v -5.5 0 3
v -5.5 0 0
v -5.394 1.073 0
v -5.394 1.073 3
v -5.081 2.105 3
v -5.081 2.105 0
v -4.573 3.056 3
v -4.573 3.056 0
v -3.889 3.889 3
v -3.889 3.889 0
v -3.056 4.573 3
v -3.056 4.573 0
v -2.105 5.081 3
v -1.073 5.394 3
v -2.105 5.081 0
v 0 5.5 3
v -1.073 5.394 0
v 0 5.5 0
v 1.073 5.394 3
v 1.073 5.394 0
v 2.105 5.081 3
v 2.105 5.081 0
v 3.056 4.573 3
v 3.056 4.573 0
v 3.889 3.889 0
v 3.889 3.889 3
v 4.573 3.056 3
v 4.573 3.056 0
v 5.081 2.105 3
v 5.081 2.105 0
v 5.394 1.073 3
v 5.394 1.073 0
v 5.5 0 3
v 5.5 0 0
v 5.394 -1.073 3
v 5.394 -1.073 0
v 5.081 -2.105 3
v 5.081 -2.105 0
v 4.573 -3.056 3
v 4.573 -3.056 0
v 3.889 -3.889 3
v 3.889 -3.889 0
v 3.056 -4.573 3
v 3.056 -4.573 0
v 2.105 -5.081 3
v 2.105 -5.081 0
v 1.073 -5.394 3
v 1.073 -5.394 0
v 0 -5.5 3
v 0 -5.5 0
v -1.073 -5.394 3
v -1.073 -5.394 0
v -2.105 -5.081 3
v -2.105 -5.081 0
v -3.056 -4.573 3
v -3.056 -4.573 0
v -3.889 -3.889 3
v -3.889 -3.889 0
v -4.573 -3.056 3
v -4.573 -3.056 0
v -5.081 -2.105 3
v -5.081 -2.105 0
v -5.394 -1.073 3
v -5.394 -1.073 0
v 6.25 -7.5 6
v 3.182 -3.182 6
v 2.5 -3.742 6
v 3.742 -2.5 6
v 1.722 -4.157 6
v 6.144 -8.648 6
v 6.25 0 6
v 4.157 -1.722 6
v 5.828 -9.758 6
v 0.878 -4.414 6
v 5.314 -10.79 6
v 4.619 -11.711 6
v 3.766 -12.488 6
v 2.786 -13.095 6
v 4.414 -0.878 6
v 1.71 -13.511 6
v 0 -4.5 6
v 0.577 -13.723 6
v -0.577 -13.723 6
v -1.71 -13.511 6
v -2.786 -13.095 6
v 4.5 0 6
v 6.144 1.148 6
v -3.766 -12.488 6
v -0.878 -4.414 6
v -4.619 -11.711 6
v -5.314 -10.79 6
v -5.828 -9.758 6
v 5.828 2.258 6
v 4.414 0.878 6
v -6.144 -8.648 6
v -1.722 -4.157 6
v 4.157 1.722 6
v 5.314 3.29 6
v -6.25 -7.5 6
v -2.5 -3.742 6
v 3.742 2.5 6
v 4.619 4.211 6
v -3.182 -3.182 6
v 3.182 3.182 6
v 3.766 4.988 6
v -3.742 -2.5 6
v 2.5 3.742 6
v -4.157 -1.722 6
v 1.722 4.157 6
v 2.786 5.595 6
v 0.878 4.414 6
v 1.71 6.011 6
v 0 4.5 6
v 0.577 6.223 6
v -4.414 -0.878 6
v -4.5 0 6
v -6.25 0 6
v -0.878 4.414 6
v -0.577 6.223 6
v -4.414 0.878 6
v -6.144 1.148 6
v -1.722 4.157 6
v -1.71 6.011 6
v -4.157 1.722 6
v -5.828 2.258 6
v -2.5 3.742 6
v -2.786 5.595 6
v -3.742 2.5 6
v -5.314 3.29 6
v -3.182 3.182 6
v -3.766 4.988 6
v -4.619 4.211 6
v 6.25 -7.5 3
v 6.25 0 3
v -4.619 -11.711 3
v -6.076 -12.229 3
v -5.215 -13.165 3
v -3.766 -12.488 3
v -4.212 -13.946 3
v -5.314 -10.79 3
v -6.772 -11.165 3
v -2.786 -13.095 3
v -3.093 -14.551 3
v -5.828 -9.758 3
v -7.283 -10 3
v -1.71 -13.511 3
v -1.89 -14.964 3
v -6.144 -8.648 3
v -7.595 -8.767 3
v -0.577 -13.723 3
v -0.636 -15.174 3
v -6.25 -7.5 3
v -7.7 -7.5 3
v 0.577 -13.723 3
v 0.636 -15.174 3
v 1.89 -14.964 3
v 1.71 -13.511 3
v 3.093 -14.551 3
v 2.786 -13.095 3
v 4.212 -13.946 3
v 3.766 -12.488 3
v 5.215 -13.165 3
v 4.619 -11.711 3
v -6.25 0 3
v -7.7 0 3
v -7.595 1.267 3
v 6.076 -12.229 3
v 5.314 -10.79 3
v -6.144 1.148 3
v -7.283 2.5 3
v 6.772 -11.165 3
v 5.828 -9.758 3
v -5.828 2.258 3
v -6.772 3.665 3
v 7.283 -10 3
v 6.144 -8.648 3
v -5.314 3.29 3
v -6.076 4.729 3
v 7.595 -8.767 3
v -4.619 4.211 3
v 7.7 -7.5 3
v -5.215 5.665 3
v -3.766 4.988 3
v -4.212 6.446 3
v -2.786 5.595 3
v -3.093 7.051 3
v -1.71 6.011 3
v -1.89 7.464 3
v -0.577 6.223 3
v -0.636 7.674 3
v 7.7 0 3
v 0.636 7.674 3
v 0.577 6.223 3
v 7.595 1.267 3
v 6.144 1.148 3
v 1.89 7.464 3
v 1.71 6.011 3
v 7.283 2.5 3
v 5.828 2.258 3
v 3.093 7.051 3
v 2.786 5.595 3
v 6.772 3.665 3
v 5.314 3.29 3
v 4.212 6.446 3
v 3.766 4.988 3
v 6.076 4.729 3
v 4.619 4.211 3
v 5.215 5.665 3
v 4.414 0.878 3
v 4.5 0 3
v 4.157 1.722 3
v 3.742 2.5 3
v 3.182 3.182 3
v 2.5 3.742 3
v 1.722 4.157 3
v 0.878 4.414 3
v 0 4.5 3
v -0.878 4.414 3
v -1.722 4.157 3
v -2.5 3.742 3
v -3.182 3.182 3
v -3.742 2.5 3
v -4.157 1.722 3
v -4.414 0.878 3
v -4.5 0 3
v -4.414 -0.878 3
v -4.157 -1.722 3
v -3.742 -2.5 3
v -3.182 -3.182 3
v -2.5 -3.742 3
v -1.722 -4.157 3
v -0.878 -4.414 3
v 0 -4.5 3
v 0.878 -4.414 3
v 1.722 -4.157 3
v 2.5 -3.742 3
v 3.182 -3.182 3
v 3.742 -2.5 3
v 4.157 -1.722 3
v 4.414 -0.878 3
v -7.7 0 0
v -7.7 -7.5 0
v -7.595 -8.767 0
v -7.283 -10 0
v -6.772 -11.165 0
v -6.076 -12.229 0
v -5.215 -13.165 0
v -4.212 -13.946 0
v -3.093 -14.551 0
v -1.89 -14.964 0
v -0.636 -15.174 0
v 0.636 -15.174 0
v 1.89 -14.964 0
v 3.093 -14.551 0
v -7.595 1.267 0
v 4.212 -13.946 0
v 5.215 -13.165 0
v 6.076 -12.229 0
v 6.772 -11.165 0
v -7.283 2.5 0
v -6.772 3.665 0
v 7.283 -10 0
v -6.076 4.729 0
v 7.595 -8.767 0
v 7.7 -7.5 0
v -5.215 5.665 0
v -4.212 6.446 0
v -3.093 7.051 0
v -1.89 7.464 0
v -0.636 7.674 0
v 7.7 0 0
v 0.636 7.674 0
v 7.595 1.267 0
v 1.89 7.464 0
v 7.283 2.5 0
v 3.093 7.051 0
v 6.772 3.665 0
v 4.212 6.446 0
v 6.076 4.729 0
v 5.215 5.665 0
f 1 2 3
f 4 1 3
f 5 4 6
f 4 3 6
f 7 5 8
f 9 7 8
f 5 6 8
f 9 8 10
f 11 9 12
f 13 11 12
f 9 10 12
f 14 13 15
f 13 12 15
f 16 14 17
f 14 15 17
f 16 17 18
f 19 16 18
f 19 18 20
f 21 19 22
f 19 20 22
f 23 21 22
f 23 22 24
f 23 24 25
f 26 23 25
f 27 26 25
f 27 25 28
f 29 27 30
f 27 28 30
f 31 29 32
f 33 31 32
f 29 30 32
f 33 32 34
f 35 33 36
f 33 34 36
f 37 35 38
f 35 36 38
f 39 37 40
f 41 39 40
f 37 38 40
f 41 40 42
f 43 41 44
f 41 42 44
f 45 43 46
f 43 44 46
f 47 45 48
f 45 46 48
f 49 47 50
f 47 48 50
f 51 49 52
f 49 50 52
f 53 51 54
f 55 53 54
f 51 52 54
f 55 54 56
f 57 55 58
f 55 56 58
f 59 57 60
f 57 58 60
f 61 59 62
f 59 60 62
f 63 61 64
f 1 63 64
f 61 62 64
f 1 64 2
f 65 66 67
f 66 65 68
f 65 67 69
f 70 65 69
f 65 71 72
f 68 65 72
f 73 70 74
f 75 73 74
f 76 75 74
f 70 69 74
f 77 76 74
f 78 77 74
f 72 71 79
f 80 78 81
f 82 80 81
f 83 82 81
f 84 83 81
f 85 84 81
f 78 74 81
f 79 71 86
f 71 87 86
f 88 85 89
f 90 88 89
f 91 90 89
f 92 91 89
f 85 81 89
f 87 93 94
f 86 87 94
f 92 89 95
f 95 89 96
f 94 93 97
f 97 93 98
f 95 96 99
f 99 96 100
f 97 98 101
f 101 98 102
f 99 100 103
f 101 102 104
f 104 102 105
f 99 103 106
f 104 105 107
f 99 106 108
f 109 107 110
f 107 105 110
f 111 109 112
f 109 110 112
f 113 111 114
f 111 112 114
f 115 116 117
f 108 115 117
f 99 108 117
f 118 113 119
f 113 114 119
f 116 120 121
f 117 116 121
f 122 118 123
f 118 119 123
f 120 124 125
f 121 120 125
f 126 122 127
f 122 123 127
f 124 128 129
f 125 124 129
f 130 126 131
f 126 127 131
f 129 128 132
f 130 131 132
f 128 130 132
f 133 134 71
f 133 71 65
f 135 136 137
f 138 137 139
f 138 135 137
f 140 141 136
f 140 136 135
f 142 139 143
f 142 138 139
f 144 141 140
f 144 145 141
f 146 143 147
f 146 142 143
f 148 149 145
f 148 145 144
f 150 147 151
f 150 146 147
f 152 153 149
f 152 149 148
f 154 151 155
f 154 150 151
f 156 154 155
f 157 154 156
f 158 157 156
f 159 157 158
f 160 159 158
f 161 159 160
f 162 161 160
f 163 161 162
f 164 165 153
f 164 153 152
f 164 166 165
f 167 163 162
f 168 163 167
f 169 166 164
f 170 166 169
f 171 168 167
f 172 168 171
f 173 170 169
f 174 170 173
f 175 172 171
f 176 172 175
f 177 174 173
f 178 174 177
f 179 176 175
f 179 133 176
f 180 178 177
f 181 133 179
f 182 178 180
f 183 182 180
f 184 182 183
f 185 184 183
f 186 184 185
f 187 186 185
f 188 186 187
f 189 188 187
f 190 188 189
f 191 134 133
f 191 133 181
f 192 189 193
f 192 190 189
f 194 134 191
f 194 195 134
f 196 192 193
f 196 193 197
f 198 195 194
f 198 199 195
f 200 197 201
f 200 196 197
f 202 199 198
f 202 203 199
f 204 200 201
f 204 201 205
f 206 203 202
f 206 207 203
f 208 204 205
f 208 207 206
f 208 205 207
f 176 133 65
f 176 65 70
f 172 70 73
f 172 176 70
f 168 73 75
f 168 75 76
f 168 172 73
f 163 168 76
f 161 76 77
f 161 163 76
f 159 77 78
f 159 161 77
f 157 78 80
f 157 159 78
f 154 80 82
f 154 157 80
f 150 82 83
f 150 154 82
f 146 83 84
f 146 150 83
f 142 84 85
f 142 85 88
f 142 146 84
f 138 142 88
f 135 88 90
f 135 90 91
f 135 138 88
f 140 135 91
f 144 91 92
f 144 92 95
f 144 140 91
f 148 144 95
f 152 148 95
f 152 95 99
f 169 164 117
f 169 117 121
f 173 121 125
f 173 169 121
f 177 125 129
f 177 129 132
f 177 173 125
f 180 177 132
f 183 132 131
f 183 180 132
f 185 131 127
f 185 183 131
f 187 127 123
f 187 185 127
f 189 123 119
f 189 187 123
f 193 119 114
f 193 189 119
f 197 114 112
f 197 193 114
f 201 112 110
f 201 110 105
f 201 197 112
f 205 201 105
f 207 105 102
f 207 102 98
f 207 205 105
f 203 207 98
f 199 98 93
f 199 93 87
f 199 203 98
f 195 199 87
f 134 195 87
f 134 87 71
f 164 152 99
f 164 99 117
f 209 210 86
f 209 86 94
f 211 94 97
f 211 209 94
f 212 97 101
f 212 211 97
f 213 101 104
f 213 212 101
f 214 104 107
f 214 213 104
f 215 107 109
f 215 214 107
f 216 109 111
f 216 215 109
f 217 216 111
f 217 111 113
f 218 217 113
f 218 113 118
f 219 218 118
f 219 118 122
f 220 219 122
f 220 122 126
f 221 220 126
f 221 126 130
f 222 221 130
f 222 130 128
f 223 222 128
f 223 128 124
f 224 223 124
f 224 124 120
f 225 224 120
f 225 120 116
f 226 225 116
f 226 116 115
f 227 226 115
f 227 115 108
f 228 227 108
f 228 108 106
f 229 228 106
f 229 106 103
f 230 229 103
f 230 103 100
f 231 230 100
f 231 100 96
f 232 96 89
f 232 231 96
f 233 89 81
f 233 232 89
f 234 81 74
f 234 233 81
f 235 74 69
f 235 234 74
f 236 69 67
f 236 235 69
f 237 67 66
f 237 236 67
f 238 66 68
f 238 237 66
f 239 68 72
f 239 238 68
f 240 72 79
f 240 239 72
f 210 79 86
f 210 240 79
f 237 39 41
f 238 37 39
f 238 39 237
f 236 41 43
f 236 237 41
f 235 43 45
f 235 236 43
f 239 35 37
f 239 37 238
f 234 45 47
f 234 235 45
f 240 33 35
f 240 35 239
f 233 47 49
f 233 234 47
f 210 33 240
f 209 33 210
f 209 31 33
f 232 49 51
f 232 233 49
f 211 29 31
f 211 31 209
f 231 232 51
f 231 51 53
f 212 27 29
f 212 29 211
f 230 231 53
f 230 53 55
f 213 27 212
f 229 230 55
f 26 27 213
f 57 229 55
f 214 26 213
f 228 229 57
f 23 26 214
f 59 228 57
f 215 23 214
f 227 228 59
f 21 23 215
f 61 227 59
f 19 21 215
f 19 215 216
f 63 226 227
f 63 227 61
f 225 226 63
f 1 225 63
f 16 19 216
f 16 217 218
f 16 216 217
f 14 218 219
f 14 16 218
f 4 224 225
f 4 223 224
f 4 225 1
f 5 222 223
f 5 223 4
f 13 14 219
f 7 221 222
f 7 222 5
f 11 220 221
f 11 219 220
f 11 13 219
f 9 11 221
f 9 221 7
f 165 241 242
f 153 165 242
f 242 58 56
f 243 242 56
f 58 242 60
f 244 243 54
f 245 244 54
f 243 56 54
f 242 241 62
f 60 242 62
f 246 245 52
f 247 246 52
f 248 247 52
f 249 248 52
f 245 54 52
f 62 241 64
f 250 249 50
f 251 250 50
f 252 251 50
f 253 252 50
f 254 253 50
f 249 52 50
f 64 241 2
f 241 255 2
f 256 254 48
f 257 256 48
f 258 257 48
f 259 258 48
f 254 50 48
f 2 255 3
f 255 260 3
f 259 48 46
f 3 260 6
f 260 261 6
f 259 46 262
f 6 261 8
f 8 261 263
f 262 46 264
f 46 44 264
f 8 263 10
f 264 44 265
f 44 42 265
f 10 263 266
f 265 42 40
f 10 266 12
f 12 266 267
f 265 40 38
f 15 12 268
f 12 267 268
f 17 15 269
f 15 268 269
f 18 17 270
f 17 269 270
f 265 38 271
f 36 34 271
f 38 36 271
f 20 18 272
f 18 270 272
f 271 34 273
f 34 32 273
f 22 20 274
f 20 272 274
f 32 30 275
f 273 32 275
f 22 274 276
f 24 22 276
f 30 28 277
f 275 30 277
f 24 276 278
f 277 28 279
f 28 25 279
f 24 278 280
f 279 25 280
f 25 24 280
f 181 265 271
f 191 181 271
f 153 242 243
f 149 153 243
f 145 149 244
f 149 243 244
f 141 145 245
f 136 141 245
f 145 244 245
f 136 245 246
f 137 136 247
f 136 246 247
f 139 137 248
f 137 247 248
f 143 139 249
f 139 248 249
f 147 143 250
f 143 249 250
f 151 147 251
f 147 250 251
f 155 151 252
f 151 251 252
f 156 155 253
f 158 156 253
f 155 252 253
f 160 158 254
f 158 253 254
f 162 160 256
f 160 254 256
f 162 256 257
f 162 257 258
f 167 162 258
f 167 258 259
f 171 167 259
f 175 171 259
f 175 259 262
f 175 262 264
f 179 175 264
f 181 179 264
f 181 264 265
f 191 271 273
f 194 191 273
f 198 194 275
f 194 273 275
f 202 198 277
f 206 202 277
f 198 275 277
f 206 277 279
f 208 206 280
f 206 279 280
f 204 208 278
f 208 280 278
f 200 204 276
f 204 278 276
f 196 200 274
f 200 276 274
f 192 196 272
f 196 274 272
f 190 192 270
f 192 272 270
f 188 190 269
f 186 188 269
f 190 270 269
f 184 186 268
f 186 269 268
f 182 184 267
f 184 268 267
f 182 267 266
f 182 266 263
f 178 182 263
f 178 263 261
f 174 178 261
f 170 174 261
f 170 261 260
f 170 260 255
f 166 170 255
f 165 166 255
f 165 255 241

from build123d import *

# Parameters (mm, degrees)
SKETCH1_R           = 4.5
BOSS_EXTRUDE1_DEPTH = 6
SKETCH3_R           = 5.5
BOSS_EXTRUDE2_DEPTH = 3
SKETCH4_R           = 5.5
CUT_EXTRUDE1_DEPTH  = 3


with BuildPart() as part:
    # Sketch1 → Boss-Extrude1 (new body)
    with BuildSketch(Plane.XY):
        with BuildLine():
            Line((6.25, 0), (6.25, -7.5))
            ThreePointArc((6.25, -7.5), (0, -13.75), (-6.25, -7.5))
            Line((-6.25, -7.5), (-6.25, 0))
            ThreePointArc((-6.25, 0), (0, 6.25), (6.25, 0))
        make_face()
        Circle(SKETCH1_R, mode=Mode.SUBTRACT)
    extrude(amount=BOSS_EXTRUDE1_DEPTH)

    # Sketch3 → Boss-Extrude2 (add)
    with BuildSketch(Plane(origin=(0, 0, 0), x_dir=(-1, 0, 0), z_dir=(0, 0, -1))):
        with BuildLine():
            Line((7.7, 0), (7.7, -7.5))
            ThreePointArc((7.7, -7.5), (0, -15.2), (-7.7, -7.5))
            Line((-7.7, -7.5), (-7.7, 0))
            ThreePointArc((-7.7, 0), (0, 7.7), (7.7, 0))
        make_face()
        Circle(SKETCH3_R, mode=Mode.SUBTRACT)
    extrude(amount=-BOSS_EXTRUDE2_DEPTH)

    # Sketch4 → Cut-Extrude1 (cut)
    with BuildSketch(Plane(origin=(0, 0, 0), x_dir=(-1, 0, 0), z_dir=(0, 0, -1))):
        Circle(SKETCH4_R)
    extrude(amount=-CUT_EXTRUDE1_DEPTH, mode=Mode.SUBTRACT)


solid = part.part
